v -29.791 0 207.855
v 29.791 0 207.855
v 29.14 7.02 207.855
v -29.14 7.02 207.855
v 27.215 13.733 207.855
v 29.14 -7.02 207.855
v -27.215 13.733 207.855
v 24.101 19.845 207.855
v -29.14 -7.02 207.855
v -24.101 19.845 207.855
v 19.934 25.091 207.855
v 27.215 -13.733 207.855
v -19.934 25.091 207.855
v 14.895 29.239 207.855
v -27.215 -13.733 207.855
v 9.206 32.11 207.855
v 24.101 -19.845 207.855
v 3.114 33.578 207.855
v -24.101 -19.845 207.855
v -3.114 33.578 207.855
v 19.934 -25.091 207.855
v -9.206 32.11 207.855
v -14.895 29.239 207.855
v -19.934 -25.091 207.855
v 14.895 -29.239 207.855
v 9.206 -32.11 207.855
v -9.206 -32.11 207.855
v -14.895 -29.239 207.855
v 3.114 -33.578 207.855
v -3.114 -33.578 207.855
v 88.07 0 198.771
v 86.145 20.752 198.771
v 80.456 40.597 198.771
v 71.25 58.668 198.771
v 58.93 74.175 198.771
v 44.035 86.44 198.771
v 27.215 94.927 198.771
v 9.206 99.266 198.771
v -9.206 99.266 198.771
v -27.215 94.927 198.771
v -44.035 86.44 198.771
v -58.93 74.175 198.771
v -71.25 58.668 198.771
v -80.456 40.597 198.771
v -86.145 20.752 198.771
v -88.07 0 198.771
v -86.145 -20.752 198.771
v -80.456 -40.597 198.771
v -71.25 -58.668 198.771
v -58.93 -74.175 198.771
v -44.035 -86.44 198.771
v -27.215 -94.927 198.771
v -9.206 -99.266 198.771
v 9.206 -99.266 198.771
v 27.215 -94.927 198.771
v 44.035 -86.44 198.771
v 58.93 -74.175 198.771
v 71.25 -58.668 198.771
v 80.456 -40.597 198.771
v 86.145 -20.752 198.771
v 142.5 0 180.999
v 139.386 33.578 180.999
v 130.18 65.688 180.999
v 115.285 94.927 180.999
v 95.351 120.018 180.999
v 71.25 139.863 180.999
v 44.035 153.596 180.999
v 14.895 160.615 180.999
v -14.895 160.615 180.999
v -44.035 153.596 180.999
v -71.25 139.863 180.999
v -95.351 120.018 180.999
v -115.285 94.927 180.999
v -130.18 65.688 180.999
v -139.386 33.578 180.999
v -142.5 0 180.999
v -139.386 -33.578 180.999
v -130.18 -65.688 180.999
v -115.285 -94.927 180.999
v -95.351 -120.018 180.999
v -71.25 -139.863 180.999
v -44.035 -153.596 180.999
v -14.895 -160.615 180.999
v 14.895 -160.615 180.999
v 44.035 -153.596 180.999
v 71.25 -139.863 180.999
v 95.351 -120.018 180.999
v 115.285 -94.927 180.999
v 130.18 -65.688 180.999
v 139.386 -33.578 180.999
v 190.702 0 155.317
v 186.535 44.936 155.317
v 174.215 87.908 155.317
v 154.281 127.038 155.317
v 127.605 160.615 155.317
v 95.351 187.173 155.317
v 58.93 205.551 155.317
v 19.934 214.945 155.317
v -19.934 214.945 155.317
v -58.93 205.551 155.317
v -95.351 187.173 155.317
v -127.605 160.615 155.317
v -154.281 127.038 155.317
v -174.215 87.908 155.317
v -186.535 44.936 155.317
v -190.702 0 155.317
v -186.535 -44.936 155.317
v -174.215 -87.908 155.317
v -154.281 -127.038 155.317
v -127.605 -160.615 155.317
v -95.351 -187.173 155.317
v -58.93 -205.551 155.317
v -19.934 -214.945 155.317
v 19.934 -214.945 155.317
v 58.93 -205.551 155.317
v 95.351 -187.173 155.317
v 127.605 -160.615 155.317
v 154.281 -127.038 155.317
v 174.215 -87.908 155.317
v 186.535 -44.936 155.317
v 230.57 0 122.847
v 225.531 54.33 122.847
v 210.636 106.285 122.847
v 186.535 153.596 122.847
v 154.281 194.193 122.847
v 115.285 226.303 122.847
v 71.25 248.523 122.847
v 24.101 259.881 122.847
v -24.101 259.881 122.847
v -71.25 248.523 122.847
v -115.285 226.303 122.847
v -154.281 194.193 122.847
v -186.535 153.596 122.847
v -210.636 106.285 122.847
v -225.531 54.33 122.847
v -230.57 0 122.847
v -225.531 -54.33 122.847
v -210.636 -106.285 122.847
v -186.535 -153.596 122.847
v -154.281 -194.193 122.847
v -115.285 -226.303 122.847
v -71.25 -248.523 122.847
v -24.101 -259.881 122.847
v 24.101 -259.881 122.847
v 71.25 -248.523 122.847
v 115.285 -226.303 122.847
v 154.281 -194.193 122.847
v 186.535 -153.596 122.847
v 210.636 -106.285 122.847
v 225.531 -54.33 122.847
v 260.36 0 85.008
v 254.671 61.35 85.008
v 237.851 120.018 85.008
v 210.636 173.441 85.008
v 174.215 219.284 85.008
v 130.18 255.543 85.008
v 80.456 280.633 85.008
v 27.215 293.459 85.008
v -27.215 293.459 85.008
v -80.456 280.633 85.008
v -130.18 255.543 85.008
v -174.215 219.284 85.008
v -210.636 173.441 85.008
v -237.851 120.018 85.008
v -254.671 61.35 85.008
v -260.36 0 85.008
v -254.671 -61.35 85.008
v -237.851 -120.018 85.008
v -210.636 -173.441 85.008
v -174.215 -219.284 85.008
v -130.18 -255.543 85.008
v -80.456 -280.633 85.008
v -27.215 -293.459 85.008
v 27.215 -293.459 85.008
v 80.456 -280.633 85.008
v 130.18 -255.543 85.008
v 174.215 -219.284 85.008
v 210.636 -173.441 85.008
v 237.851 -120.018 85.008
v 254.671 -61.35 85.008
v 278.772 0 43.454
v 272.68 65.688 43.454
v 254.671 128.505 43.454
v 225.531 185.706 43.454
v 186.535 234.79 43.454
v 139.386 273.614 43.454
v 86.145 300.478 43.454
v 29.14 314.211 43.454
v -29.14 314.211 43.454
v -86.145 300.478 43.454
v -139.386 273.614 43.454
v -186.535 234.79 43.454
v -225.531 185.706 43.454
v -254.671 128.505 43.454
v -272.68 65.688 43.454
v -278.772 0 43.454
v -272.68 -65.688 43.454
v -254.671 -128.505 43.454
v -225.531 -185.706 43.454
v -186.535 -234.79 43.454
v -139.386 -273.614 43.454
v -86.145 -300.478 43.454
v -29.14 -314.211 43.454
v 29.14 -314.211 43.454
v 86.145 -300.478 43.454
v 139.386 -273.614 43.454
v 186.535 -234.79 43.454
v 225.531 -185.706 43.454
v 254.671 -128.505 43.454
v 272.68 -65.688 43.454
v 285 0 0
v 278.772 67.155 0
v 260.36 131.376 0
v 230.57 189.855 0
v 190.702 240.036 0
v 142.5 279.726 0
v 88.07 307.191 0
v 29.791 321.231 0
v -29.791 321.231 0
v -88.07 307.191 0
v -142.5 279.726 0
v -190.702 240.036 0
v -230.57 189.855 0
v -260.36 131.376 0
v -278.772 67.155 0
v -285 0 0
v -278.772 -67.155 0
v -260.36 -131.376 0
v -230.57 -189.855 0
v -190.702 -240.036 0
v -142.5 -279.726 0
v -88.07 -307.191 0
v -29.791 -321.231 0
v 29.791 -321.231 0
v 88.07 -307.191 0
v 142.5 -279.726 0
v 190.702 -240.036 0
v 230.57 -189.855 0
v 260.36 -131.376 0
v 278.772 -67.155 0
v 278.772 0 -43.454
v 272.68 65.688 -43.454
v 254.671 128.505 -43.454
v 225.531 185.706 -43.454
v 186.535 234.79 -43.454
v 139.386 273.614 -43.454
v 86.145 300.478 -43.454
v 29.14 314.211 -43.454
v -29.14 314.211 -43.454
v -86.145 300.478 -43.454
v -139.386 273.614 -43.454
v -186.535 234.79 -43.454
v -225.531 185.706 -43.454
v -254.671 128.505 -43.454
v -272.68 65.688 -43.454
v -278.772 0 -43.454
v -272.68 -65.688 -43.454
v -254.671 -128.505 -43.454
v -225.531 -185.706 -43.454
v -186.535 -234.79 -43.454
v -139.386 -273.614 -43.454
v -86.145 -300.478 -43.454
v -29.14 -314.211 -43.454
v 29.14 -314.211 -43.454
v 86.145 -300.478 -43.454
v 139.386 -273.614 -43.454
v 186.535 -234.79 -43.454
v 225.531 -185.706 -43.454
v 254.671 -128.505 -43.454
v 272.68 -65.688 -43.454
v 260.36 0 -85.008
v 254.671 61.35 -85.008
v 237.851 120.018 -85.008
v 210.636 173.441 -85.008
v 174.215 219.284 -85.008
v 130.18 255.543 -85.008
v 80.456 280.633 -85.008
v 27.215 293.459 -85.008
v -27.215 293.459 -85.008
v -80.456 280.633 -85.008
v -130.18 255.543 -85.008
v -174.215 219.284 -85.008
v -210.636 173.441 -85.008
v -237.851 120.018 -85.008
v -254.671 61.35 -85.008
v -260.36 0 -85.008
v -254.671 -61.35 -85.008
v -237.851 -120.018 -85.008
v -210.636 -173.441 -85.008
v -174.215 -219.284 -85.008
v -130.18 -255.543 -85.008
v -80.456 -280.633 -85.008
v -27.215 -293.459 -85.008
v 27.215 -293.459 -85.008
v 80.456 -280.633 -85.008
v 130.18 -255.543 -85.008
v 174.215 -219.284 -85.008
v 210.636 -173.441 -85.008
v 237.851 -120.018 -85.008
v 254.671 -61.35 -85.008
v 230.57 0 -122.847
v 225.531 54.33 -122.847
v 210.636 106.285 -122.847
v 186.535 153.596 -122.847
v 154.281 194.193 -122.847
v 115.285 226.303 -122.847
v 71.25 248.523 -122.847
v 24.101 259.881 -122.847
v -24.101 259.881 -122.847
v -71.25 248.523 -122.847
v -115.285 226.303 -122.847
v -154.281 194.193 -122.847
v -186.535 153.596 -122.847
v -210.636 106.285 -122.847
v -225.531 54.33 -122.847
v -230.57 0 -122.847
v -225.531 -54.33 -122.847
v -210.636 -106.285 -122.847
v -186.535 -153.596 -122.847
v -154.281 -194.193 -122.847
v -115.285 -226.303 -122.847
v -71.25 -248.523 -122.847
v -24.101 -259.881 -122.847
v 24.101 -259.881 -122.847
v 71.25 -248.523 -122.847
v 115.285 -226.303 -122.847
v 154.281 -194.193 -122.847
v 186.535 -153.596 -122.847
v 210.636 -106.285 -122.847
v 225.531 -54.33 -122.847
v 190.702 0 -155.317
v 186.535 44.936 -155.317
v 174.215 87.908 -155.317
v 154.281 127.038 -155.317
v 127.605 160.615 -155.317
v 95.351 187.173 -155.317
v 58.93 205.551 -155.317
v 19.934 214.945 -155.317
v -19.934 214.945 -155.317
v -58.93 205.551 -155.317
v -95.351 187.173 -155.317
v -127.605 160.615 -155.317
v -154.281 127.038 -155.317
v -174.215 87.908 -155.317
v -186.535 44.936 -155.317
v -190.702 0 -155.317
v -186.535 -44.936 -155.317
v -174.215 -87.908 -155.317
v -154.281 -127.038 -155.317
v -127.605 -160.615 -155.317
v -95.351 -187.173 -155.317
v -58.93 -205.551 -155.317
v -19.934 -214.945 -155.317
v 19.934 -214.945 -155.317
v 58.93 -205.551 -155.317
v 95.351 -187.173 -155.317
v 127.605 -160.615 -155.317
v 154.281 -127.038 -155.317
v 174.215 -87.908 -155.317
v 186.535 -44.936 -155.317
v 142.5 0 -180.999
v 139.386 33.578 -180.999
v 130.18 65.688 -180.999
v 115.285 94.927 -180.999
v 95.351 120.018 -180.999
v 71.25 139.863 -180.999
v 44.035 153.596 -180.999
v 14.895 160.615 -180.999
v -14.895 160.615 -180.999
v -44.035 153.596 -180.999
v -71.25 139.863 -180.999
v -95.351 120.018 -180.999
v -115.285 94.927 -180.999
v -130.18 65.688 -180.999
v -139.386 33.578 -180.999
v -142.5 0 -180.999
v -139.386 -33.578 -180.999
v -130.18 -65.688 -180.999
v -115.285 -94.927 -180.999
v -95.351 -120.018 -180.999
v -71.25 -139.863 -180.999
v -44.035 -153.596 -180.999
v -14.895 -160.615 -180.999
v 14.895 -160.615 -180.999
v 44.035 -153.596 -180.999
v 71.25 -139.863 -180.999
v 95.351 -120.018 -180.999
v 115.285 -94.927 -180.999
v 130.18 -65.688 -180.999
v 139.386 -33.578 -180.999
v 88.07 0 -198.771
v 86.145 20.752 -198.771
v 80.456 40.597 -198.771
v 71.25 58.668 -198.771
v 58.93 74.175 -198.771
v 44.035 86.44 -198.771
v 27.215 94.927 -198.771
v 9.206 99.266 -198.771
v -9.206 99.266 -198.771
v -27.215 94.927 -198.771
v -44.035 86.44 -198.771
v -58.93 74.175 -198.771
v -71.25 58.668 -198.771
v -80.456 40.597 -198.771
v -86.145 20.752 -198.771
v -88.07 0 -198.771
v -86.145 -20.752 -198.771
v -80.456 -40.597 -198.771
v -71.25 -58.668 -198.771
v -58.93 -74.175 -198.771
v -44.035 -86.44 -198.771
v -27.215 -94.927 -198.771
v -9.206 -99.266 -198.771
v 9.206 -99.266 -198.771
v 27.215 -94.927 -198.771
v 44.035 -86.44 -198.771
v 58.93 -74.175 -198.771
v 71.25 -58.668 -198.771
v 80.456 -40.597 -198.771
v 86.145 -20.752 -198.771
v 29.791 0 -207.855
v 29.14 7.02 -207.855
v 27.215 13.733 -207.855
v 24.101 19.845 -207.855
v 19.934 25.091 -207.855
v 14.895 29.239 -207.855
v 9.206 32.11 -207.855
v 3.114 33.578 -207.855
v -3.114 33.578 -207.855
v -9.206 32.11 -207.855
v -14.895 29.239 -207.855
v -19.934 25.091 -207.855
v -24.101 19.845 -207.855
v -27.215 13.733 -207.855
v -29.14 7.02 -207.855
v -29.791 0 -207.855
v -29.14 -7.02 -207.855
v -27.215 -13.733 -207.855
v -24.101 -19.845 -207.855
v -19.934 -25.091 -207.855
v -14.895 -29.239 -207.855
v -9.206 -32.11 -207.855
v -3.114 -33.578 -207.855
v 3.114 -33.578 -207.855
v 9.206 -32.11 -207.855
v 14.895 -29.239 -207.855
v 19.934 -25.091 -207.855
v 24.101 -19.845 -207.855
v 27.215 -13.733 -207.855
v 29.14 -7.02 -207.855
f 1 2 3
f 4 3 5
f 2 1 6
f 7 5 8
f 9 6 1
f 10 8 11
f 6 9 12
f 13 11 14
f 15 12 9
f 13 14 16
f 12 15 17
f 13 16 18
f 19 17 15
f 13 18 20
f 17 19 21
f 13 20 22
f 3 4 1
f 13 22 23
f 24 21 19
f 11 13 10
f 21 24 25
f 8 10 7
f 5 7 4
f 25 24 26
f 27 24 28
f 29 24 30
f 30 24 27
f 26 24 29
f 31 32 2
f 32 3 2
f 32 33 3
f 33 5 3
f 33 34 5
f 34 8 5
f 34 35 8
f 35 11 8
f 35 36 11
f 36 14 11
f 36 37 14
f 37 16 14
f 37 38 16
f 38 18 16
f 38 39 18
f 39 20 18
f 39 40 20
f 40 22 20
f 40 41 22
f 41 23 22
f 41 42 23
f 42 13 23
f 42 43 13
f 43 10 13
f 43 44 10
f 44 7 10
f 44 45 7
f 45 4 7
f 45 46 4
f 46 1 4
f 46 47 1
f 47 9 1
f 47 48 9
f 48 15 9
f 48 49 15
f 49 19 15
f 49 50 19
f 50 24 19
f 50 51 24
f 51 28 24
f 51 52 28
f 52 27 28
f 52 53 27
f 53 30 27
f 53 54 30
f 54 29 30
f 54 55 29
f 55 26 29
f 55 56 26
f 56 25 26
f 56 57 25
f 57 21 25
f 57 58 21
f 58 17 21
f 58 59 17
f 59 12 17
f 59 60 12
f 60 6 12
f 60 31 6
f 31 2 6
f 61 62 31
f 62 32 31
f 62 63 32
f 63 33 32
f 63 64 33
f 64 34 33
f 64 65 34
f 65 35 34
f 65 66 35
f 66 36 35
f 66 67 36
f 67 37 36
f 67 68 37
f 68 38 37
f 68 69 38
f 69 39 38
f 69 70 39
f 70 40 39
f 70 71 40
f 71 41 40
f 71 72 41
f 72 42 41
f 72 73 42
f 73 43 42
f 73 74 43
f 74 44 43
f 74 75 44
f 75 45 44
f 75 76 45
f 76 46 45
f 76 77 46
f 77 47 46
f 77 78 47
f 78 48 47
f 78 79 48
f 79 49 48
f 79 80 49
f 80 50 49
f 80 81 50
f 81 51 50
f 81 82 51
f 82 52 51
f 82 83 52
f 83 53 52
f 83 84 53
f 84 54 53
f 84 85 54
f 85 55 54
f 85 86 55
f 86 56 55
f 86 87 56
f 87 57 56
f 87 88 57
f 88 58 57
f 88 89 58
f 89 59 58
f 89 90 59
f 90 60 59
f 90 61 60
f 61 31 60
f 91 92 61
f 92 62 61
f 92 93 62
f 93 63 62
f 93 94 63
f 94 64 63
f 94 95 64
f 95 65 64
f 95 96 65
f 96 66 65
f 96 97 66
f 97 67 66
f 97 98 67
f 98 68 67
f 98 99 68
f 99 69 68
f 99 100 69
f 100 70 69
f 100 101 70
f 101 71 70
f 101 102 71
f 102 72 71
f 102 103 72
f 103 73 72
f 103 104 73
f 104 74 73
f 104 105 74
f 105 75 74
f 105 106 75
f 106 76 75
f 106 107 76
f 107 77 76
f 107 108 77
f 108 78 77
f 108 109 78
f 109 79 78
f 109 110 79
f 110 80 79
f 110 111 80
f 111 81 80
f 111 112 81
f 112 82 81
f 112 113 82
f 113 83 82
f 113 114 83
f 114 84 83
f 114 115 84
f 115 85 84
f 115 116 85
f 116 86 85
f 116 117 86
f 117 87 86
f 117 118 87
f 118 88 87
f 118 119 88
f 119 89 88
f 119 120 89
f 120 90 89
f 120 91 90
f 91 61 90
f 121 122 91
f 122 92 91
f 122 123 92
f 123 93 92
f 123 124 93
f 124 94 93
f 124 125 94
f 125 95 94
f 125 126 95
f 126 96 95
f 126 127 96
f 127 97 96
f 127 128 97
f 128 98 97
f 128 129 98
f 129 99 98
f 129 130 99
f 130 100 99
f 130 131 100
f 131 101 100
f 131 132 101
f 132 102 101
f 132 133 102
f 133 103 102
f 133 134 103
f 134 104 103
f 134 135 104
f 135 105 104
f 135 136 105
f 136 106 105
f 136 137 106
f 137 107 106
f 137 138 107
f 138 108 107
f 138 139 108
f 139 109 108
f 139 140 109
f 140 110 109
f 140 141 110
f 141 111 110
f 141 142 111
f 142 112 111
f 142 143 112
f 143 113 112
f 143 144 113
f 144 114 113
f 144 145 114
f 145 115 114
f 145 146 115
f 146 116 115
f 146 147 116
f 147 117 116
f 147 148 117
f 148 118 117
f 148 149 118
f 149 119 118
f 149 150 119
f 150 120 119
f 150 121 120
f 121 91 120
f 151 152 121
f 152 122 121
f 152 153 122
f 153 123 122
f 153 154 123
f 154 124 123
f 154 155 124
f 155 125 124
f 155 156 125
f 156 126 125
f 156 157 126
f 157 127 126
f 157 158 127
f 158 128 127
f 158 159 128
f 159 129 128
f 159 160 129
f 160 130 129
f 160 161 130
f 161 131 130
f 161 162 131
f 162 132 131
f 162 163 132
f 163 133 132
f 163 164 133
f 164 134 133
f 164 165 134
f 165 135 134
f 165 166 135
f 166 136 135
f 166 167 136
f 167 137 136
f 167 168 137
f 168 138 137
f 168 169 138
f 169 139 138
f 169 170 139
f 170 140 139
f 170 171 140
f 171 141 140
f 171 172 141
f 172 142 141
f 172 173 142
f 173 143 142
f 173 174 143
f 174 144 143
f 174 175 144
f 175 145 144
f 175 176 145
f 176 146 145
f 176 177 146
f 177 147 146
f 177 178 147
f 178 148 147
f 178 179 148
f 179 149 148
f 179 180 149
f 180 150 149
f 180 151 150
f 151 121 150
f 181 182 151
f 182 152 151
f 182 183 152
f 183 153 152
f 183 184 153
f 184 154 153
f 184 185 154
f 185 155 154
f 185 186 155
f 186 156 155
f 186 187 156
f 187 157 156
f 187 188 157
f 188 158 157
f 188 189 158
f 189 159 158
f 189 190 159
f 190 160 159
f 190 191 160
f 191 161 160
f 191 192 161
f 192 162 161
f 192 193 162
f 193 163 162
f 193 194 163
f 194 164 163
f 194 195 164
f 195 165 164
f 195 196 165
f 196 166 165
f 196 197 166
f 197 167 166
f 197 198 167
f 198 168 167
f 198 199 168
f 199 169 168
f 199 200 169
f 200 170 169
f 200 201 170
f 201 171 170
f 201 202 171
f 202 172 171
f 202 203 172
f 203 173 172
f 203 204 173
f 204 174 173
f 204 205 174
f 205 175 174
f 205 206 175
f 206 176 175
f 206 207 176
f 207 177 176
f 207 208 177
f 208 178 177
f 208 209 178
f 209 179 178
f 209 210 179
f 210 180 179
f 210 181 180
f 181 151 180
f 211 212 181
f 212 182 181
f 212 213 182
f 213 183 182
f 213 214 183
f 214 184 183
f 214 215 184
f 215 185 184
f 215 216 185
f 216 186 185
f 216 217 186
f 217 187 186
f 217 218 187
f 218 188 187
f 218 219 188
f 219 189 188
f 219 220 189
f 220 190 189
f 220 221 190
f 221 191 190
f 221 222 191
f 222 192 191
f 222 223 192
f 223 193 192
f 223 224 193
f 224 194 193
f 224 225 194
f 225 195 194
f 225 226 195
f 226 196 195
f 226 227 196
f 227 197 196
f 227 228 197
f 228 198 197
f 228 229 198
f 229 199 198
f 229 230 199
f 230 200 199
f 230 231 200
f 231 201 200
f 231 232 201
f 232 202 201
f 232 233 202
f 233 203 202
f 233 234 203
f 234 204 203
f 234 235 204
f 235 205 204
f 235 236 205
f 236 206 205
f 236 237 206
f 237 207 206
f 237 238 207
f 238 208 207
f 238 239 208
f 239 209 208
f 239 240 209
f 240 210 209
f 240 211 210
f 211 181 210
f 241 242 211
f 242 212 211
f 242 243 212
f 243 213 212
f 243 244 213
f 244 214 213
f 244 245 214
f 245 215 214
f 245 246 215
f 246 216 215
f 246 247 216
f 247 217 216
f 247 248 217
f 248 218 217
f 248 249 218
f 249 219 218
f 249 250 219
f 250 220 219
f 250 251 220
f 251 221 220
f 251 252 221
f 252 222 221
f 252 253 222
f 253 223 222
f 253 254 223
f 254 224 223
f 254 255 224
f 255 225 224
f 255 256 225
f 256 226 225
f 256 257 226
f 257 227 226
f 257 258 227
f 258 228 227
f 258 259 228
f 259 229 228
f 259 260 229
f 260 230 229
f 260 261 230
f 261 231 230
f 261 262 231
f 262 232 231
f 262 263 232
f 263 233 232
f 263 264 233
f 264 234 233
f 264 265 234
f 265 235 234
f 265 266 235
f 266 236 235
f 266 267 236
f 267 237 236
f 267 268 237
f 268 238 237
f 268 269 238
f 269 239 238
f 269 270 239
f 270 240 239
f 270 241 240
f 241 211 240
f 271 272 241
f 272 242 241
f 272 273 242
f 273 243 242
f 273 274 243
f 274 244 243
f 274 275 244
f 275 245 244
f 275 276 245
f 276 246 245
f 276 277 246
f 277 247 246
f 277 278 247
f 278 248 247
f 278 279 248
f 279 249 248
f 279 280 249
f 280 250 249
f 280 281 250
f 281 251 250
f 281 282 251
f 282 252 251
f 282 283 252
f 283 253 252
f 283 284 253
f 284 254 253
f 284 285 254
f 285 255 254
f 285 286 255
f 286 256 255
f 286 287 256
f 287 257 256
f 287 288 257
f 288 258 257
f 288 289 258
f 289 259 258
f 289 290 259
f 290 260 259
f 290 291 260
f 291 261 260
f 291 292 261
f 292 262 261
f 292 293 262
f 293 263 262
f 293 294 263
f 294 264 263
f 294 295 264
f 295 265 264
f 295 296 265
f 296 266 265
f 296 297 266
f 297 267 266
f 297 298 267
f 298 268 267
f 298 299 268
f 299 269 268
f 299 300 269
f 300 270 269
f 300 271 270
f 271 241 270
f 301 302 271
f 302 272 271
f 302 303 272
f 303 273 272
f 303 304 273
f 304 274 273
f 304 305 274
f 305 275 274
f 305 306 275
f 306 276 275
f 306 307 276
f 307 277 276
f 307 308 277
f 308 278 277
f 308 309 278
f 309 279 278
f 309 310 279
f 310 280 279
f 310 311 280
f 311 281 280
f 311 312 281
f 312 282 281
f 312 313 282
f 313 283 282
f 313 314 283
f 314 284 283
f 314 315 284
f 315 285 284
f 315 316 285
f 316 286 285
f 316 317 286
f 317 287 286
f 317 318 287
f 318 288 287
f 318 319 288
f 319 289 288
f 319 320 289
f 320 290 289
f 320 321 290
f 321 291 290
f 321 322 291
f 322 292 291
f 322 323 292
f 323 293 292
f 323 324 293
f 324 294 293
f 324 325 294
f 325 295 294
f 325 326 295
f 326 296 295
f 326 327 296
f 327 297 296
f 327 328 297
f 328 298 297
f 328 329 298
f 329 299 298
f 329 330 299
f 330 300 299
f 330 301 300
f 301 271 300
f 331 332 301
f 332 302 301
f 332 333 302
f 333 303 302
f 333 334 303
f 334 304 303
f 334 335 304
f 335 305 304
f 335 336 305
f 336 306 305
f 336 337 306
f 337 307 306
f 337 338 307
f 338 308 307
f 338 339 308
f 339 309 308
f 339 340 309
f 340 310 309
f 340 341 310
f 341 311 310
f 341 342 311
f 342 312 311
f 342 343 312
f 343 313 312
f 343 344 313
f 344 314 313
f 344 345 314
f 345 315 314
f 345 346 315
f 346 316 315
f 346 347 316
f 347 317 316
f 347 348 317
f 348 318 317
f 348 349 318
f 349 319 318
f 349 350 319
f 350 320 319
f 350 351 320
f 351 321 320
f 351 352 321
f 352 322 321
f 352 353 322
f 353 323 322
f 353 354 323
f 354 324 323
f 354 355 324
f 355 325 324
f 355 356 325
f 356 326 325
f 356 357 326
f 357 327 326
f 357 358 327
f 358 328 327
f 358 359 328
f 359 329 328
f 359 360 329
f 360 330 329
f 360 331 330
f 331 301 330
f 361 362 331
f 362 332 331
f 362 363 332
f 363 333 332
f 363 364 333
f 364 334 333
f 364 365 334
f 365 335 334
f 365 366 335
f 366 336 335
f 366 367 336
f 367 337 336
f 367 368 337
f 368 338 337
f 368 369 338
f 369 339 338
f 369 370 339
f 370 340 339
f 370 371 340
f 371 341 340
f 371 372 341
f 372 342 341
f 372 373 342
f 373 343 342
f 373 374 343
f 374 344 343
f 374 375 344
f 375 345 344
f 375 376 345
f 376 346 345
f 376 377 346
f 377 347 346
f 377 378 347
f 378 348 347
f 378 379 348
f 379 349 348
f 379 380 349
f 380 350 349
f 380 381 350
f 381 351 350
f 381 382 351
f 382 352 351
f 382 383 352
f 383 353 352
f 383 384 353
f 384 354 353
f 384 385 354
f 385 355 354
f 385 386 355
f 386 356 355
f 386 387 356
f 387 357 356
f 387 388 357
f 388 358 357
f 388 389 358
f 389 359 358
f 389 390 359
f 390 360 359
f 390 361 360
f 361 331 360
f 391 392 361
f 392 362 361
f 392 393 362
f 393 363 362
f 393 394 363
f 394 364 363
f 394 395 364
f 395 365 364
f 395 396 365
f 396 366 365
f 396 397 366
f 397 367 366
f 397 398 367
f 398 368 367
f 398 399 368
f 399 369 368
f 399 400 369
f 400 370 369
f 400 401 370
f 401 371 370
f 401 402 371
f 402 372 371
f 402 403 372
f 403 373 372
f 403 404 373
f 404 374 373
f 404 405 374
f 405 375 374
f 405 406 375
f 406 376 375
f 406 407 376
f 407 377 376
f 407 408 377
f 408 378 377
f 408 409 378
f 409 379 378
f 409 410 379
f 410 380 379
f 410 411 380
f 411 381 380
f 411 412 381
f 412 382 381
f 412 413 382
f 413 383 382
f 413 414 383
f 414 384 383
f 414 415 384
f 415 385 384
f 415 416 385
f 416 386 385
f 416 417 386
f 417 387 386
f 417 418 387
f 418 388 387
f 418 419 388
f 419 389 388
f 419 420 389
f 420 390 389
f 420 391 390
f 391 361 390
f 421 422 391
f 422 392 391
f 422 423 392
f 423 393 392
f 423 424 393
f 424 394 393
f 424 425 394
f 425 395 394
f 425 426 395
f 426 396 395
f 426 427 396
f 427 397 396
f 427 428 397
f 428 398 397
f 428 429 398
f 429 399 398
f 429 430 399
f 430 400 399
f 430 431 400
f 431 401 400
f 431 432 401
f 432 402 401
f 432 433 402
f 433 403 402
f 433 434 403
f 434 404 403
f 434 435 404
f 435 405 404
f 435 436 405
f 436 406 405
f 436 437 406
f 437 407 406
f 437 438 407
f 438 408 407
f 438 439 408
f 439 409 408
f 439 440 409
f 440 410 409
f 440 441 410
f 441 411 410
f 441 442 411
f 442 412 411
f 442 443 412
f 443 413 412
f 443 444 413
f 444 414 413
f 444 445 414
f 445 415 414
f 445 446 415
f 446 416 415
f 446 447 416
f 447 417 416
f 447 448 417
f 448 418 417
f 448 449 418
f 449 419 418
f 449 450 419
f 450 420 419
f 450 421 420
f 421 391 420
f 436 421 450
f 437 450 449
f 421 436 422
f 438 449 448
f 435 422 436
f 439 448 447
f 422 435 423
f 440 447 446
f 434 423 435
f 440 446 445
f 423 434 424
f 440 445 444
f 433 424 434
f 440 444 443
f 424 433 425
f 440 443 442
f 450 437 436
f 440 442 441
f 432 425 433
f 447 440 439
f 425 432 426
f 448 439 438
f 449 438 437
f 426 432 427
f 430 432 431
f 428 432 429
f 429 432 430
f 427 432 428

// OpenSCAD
// Generated by SolidPython 1.0.1 on 2020-07-29 00:46:52


scale(v = [15, 17, 11]) {
	sphere(r = 19);
}
/***********************************************
*********      SolidPython code:      **********
************************************************
 
# import packages: SolidPython
from solid import *
from solid.utils import *
from itertools import chain, combinations, permutations


class Resize:

    def __init__(self, scad_file):
        self.scad_file = scad_file
        #self.scad_file = import_scad(scad_file)
        # cone/cylinder param:
        self.r1 = 0
        self.r2 = 0
        self.h = 0
        # rectangular prism param:
        self.w = 0
        self.l = 0
        # ellipse param:
        self.r = 0

    # import OpenScad code (file name corresponds to shape)


    # classify shape + parameters
    def assign(self, param1, param2, param3):
        if self.scad_file == 'cone.scad':
            self.r1 = param1
            self.r2 = param2
            self.h = param3
        elif self.scad_file == 'cylinder.scad':
            self.r1 = param1
            self.r2 = param2
            self.h = param3
        elif self.scad_file == 'rectangularPrism.scad':
            self.h = param1
            self.l = param2
            self.w = param3
        else:
            self.r = param1
            self.h = param2

    # resize parameters
    def iterate(self):
        x = range(3, 20, 2)
        i = 1
        if self.scad_file == 'cone.scad':
            tempList = list(permutations(x, 2))
            for temp in tempList:
                param1 = temp[0]
                param2 = temp[1]
                filepath = 'produced_scad_files/' + 'cone' + str(param1) + '_' + str(param2) + '_' + '.scad'
                scad_render_to_file(cylinder(h=param1, r1=param2, r2=0), filepath)

        elif self.scad_file == 'cylinder.scad':
            tempList = list(permutations(x, 3))
            for temp in tempList:
                param1 = temp[0]
                param2 = temp[1]
                filepath = 'produced_scad_files/' + 'cylinder' + str(param1) + '_' + str(param2) + '_' + '.scad'
                scad_render_to_file(cylinder(h=param1, r1=param2, r2=param2), filepath)

        elif self.scad_file == 'rectangularPrism.scad':
            tempList = list(permutations(x, 3))
            for temp in tempList:
                param1 = temp[0]
                param2 = temp[1]
                param3 = temp[2]
                filepath = 'produced_scad_files/' + 'rectangularPrism' + str(param1) + '_' + str(param2) + '_' + str(
                    param3) + '.scad'
                scad_render_to_file(cube(size=(param1, param2, param3)), filepath)

        elif self.scad_file == 'ellipse.scad':
            tempList = list(permutations(x, 4))
            for temp in tempList:
                param1 = temp[0]
                param2 = temp[1]
                param3 = temp[2]
                param4 = temp[3]
                filepath = 'produced_scad_files/' + 'ellipse' + str(param1) + '_' + str(param2) + '_' + str(param3) + '_' + str(param4) + '.scad'
                scad_render_to_file(scale([param1, param2, param3])(sphere(r=param4)), filepath)

    def render_to_scadfile(self):
        scad_render_to_file(scad, 'example.scad') 
 
************************************************/
